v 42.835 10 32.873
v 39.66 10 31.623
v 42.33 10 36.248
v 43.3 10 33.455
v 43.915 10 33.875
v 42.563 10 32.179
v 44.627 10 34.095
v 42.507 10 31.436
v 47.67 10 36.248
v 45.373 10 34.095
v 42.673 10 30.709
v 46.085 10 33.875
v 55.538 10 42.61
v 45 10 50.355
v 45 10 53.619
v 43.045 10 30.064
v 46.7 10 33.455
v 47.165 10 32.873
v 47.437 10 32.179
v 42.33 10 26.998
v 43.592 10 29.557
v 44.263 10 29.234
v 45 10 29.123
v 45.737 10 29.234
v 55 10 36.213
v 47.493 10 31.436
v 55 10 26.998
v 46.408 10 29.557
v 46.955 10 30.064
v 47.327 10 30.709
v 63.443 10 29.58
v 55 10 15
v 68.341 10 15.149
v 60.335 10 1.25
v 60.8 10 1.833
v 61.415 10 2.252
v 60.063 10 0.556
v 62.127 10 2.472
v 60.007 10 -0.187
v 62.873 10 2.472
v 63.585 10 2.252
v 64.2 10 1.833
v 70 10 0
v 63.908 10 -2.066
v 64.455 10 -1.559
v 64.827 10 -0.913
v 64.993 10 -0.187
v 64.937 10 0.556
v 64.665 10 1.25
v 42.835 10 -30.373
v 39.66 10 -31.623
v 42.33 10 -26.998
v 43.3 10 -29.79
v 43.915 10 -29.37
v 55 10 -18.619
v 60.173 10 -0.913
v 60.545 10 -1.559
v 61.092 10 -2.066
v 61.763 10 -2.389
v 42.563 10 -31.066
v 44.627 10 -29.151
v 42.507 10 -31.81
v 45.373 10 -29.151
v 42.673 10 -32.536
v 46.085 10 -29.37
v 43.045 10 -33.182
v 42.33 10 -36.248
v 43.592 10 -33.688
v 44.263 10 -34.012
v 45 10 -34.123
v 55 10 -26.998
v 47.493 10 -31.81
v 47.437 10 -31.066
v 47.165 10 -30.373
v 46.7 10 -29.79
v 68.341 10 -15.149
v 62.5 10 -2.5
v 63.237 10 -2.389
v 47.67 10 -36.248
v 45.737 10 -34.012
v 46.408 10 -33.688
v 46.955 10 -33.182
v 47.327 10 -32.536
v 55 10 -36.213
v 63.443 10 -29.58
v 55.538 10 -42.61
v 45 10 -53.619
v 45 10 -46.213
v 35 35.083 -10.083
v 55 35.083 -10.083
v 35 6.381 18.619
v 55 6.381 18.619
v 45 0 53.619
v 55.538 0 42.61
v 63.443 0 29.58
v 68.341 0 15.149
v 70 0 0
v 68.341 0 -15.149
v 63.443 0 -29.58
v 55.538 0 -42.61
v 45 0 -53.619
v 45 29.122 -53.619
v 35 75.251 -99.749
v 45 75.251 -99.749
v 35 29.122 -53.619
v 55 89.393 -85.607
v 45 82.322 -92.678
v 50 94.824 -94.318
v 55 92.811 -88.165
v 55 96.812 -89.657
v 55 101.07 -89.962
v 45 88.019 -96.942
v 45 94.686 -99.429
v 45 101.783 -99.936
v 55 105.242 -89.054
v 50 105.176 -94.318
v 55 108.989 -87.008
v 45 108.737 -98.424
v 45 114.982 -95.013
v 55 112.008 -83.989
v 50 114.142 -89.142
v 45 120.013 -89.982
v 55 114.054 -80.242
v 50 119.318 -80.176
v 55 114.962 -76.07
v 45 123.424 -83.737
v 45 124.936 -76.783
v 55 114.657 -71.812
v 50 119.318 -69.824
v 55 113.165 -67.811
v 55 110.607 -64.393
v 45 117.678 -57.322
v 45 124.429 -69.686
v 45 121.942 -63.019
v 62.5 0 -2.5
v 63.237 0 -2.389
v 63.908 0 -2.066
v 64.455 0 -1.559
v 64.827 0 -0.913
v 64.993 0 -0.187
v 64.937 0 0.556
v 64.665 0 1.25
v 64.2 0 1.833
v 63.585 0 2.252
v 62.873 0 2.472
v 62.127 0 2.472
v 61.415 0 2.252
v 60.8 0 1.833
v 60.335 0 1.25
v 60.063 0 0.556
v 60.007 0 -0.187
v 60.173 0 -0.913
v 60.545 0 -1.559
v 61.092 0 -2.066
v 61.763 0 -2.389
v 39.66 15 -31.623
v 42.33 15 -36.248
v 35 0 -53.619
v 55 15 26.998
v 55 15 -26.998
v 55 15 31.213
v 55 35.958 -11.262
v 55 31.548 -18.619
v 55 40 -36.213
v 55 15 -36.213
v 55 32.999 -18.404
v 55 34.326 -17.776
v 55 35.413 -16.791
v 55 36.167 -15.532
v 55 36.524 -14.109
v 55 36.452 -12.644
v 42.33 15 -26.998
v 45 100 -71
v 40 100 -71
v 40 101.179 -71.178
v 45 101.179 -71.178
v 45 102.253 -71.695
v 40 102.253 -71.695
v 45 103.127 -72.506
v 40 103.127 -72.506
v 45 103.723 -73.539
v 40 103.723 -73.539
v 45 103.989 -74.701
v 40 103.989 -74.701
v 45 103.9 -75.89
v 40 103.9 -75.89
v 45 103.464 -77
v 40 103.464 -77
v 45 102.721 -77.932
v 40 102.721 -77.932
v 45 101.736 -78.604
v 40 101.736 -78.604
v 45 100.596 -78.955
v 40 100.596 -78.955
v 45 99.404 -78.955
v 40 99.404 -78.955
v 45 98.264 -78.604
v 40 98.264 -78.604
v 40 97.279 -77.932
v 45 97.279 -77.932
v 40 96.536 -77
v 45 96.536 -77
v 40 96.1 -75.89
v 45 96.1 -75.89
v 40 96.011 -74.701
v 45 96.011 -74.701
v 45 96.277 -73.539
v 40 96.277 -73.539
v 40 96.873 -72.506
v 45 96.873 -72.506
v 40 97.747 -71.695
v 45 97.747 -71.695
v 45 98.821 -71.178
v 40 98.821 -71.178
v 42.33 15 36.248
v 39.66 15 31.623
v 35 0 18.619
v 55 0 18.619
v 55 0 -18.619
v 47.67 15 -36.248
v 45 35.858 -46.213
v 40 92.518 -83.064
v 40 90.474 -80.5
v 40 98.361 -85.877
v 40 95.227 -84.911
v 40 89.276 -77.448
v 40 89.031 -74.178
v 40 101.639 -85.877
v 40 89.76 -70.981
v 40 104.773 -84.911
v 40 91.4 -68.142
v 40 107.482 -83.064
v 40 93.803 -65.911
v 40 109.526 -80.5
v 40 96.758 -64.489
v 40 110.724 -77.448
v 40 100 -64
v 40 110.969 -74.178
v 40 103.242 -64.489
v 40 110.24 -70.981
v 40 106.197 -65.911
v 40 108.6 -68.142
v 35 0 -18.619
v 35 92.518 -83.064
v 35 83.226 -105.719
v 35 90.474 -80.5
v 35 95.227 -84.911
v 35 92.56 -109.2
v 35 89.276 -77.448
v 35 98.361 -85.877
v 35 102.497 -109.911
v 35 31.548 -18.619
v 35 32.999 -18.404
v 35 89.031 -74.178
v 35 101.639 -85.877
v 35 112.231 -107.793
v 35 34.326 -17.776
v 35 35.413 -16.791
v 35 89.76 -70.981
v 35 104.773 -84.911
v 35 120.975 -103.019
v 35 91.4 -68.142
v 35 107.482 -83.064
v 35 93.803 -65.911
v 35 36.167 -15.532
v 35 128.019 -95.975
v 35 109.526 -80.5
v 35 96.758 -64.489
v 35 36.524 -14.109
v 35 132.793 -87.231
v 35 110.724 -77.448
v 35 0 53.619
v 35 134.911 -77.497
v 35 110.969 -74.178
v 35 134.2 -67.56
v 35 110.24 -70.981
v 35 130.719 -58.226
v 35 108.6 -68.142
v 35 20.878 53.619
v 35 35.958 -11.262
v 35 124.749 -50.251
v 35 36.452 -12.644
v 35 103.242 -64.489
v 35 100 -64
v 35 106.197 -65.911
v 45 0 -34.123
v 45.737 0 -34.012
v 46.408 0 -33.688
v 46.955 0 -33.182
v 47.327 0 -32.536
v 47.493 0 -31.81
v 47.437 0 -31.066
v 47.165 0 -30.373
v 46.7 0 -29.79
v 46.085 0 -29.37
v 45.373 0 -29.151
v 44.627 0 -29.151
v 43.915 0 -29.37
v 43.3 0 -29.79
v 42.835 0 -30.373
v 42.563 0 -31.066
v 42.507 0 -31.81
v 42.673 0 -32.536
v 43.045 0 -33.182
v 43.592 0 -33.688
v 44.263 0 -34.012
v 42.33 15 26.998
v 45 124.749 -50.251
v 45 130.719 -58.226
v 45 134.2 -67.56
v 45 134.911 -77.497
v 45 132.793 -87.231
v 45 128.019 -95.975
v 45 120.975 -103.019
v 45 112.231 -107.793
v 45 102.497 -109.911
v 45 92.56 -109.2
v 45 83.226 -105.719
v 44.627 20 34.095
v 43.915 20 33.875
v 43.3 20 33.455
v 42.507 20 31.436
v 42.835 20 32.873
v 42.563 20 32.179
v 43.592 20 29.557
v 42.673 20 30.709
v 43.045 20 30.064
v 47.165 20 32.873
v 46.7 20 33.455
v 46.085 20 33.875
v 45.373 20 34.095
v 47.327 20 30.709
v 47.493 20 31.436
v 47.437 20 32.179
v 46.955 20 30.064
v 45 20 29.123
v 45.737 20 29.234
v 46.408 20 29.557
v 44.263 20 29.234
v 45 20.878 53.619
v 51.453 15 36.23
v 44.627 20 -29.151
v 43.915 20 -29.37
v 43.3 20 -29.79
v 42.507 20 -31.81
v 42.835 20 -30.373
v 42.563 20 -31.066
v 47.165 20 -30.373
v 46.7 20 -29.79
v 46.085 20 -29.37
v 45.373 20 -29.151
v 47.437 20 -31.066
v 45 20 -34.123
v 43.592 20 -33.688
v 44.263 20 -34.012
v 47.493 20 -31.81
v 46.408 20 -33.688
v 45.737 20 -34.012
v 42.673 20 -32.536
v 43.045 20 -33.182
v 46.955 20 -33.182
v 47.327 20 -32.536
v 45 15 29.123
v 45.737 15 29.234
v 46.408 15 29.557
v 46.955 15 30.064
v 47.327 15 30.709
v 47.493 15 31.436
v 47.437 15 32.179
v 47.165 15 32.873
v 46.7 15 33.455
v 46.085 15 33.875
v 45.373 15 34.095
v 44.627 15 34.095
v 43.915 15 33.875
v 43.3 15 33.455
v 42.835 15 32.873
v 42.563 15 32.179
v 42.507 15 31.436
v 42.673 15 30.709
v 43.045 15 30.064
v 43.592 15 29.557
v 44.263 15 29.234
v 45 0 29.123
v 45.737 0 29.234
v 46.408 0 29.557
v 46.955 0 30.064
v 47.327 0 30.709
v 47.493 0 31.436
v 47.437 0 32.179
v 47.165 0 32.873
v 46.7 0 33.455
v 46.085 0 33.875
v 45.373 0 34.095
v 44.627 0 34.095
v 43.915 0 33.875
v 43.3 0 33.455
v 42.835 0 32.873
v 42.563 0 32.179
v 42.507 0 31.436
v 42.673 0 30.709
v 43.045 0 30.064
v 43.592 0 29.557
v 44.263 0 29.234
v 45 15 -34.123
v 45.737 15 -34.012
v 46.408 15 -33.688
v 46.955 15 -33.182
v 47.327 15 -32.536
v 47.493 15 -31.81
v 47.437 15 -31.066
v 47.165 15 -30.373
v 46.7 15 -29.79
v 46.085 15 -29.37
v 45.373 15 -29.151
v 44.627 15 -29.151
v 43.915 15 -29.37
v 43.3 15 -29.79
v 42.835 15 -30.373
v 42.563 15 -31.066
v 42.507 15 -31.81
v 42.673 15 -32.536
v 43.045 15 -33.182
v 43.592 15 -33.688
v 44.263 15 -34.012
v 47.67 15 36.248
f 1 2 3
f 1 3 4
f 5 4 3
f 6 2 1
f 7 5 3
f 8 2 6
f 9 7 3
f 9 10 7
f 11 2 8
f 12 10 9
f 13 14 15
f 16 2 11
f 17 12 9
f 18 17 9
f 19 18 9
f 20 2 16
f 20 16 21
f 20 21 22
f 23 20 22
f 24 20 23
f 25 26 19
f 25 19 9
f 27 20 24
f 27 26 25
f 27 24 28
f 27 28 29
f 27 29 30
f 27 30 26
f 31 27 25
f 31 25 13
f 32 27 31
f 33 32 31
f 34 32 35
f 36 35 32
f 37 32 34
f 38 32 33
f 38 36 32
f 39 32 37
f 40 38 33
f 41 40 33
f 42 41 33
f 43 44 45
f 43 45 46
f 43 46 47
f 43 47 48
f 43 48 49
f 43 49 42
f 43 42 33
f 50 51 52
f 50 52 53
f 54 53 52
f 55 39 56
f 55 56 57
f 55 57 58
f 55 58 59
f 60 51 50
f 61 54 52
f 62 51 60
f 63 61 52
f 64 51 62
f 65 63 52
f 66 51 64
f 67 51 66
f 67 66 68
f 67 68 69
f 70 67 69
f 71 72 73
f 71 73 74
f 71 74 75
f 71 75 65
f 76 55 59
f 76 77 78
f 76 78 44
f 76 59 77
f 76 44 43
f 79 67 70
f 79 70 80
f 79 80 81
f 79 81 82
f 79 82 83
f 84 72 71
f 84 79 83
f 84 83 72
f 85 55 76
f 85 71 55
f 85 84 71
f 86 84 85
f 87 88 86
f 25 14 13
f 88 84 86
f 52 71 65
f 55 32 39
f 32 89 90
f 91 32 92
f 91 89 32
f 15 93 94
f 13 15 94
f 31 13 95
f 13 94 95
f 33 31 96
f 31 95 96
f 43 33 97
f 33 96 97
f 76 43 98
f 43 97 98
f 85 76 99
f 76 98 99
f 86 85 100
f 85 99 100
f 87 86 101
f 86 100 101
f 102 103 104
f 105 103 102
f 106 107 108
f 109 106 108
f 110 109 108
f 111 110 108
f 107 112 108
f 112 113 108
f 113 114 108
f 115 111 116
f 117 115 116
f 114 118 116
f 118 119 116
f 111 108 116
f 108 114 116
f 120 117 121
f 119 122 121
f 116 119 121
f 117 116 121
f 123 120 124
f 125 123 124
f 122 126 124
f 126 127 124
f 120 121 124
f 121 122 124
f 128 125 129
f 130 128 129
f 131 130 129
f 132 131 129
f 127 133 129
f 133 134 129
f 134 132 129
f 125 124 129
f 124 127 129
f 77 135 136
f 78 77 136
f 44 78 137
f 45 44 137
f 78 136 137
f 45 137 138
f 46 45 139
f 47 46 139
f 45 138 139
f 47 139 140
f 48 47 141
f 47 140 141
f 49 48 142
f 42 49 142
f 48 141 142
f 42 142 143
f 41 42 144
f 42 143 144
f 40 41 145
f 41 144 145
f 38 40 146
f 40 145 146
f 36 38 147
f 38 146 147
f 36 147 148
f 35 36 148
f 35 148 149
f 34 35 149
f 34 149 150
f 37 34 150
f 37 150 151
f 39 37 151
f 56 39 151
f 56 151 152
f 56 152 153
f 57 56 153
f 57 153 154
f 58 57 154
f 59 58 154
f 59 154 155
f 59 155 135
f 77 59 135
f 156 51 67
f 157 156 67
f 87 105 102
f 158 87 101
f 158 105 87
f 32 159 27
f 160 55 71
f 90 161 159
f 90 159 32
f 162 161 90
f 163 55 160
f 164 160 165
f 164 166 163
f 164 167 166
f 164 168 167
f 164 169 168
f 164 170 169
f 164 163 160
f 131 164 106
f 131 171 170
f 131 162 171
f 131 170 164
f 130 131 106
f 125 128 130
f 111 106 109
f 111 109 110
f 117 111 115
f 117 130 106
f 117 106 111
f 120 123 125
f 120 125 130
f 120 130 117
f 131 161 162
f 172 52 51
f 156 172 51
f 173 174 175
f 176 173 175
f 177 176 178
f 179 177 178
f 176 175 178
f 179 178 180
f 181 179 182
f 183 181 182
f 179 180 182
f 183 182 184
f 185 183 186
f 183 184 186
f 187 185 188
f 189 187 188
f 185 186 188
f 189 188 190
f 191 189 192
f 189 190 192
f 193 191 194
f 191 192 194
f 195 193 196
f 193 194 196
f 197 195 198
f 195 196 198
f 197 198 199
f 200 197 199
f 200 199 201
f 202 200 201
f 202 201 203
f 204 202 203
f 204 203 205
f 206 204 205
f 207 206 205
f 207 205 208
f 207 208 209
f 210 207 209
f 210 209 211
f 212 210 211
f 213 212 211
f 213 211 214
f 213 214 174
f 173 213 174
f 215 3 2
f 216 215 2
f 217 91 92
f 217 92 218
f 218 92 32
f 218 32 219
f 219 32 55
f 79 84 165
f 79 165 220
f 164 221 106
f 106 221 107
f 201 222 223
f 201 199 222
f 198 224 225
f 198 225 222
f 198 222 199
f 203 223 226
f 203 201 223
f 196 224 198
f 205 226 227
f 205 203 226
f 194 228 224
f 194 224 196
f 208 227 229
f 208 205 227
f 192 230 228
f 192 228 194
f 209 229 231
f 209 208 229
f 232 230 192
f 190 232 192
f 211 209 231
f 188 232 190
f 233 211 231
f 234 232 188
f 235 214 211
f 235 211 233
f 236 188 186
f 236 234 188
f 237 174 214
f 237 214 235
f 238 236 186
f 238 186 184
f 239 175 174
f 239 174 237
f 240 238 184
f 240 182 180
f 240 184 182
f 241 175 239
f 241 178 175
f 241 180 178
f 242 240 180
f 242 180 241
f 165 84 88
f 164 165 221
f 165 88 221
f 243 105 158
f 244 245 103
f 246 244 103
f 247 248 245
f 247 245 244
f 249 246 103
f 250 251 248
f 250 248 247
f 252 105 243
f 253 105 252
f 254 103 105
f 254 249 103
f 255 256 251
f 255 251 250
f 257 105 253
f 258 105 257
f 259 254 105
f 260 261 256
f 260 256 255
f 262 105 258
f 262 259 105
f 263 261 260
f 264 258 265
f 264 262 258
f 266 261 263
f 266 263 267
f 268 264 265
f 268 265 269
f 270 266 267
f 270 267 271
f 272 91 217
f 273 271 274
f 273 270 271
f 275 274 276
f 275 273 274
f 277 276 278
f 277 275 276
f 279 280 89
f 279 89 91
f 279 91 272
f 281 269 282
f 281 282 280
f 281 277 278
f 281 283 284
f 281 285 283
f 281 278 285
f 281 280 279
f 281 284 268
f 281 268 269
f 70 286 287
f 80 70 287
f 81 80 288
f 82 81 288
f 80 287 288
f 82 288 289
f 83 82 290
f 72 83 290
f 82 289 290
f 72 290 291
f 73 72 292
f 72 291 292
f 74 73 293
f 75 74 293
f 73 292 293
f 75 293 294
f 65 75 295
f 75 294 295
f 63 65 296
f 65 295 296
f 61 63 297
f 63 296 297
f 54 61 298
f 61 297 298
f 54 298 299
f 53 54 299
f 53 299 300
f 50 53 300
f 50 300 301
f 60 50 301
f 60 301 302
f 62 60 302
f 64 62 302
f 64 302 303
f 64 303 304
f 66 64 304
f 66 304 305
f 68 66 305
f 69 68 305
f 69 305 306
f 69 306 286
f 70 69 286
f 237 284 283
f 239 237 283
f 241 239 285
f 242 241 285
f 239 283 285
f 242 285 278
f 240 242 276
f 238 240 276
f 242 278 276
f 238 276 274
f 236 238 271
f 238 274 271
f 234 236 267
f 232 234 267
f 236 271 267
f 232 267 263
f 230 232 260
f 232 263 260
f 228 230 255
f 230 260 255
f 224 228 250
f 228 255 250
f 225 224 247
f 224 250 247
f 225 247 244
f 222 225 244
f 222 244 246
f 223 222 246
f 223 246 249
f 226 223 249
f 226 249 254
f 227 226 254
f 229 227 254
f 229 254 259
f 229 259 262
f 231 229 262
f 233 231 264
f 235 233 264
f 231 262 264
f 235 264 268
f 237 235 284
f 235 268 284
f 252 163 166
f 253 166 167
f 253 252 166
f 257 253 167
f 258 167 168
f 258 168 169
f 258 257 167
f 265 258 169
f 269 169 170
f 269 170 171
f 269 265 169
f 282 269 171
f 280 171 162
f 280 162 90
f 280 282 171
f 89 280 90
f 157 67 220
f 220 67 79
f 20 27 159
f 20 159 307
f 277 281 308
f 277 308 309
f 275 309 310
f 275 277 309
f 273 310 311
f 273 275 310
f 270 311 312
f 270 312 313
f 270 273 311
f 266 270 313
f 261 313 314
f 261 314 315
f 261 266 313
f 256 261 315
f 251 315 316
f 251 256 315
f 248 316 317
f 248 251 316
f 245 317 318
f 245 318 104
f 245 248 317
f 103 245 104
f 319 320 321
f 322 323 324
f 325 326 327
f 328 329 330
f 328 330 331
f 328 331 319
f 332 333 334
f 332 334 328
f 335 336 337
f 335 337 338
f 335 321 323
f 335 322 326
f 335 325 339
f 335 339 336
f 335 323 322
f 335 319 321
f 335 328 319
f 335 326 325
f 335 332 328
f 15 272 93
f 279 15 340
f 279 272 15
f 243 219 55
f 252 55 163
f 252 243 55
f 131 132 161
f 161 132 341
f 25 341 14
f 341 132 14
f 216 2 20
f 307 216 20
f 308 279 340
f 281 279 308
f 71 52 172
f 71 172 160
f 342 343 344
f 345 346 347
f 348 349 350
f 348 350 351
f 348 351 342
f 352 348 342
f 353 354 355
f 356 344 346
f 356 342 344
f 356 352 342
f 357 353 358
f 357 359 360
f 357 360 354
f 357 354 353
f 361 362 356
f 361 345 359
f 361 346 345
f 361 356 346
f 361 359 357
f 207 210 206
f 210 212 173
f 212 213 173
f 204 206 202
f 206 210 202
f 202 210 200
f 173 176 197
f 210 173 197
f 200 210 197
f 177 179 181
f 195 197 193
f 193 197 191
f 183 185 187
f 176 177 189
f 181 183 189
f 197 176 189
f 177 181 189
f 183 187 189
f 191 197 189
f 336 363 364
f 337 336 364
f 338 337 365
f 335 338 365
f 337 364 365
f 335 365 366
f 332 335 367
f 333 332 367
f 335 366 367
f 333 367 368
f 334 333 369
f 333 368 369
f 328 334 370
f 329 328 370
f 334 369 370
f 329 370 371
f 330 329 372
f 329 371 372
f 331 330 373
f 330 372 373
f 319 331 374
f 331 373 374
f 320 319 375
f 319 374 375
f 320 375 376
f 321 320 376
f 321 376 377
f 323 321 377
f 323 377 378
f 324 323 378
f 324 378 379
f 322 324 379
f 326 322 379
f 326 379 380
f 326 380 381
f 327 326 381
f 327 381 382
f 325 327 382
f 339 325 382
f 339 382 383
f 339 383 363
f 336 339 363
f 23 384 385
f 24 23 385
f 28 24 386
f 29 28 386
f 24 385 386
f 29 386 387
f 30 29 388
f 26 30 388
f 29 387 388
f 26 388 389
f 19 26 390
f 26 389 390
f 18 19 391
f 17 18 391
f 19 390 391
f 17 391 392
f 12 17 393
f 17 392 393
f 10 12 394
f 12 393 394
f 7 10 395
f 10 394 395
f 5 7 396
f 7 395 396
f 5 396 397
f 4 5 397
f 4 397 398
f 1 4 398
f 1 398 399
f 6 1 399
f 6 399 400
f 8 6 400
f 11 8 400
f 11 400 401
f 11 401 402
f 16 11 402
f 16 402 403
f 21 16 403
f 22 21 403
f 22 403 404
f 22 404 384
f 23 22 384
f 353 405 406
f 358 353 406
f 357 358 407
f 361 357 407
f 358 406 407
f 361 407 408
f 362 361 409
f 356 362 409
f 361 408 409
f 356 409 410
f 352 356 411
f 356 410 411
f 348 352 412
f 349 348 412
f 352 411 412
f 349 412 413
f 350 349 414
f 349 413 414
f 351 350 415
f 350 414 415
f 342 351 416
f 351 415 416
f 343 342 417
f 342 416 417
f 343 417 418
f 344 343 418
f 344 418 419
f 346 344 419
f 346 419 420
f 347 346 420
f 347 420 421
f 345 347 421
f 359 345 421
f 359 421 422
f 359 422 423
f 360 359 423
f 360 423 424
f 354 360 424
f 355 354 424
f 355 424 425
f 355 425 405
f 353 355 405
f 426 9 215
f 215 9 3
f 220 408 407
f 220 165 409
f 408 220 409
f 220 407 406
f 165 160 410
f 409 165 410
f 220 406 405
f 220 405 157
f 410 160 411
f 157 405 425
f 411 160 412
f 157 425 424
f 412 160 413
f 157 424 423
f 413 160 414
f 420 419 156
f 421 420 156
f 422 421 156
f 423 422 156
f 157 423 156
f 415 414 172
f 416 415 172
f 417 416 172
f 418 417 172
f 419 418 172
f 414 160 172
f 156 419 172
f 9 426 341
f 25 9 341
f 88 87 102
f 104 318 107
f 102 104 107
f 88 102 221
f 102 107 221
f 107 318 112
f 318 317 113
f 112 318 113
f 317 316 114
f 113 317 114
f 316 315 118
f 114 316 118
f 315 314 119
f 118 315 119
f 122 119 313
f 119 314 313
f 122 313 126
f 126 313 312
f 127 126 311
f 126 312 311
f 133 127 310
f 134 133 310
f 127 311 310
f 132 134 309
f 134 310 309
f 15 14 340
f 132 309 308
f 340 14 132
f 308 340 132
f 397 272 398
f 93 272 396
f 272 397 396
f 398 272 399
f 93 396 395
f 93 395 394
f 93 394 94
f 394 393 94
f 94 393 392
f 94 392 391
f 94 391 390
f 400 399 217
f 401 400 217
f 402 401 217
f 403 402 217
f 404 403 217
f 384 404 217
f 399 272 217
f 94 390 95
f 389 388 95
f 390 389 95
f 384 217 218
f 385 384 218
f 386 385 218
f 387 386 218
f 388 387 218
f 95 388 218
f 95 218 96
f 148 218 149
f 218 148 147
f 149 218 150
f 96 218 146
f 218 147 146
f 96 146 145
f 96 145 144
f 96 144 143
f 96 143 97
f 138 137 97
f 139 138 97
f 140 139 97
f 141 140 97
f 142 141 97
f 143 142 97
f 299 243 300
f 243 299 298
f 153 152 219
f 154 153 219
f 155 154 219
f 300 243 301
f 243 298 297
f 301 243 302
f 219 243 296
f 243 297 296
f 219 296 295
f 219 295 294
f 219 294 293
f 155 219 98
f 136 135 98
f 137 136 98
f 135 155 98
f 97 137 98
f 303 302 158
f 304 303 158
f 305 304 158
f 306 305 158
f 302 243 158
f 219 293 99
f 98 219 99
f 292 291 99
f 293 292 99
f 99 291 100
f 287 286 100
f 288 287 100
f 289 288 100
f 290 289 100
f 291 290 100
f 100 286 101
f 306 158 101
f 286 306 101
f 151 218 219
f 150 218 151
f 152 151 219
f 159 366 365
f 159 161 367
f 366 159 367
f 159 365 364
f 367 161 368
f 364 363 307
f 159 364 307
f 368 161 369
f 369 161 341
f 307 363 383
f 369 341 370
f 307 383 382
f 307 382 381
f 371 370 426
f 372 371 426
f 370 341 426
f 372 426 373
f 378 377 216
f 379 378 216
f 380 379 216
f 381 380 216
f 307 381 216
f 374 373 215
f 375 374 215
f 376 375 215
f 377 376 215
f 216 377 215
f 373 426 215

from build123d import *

# Parameters (mm, degrees)
BOSS_EXTRUDE3_DEPTH = 10
SKETCH4_R           = 35
SKETCH4_R_2         = 4
BOSS_EXTRUDE4_DEPTH = 10
BOSS_EXTRUDE6_DEPTH = 10
CHAMFER2_SIZE       = 30
CHAMFER2_SIZE2      = 42.426406871
CHAMFER3_SIZE       = 10
CUT_EXTRUDE1_DEPTH  = 20
SKETCH8_R           = 2.5
CUT_EXTRUDE2_DEPTH  = 20
CUT_EXTRUDE4_START  = -10
SKETCH9_R           = 2.5
CUT_EXTRUDE4_DEPTH  = 5
SKETCH10_R          = 11
CUT_EXTRUDE5_DEPTH  = 5


with BuildPart() as part:
    # Sketch3 → Boss-Extrude3 (new body)
    with BuildSketch(Plane(origin=(0, 0, 0), x_dir=(1, 0, 0), z_dir=(0, 1, 0))):
        with BuildLine():
            Line((45, 53.619026474), (35, 53.619026474))
            Line((35, 53.619026474), (35, -53.619026474))
            Line((35, -53.619026474), (45, -53.619026474))
            ThreePointArc((45, -53.619026474), (70, 0), (45, 53.619026474))
        make_face()
    extrude(amount=BOSS_EXTRUDE3_DEPTH)

    # Sketch4 → Boss-Extrude4 (add)
    # profile 1 of 2: a face of its own
    with BuildSketch(Plane.ZY.offset(-35)):
        with BuildLine():
            Line((-53.619026474, 29.121551791), (-53.619026474, 10))
            Line((-53.619026474, 10), (53.619026474, 10))
            Line((53.619026474, 10), (53.619026474, 20.878448209))
            Line((53.619026474, 20.878448209), (-50.251262658, 124.748737342))
            ThreePointArc((-50.251262658, 124.748737342), (-42.664216362, 113.393920133), (-40, 100))
            ThreePointArc((-40, 100), (-61.606079867, 67.664216362), (-99.748737342, 75.251262658))
            Line((-99.748737342, 75.251262658), (-53.619026474, 29.121551791))
        make_face()
    # profile 2 of 2: a face of its own
    with BuildSketch(Plane.ZY.offset(-35)):
        with Locations((-75, 100)):
            Circle(SKETCH4_R)
        with Locations((-75, 100)):
            Circle(SKETCH4_R_2, mode=Mode.SUBTRACT)
    extrude(amount=-BOSS_EXTRUDE4_DEPTH)

    # Sketch6 → Boss-Extrude6 (add)
    with BuildSketch(Plane(origin=(45, 0, 0), x_dir=(0, 0, -1), z_dir=(1, 0, 0))):
        with BuildLine():
            Line((64.393398282, 110.606601718), (-36.213203436, 10))
            Line((-36.213203436, 10), (6.213203436, 10))
            Line((6.213203436, 10), (85.606601718, 89.393398282))
            ThreePointArc((85.606601718, 89.393398282), (85.606601718, 110.606601718), (64.393398282, 110.606601718))
        make_face()
    extrude(amount=BOSS_EXTRUDE6_DEPTH)

    # Chamfer2
    chamfer2_edges = [part.edges().sort_by_distance(p)[0] for p in [
        (50, 10, -6.213203436),
    ]]
    chamfer2_side = [part.faces().sort_by_distance(p)[0] for p in [
        (56.695914019, 10, -4.424051509),
    ]]
    chamfer(chamfer2_edges, length=CHAMFER2_SIZE, length2=CHAMFER2_SIZE2, reference=chamfer2_side[0])

    # Chamfer3
    chamfer3_edges = [part.edges().sort_by_distance(p)[0] for p in [
        (45, 25, -36.213203436),
        (45, 64.696699141, -60.909902577),
        (45, 110.606601718, -85.606601718),
        (45, 60.303300859, -14.090097423),
    ]]
    chamfer(chamfer3_edges, length=CHAMFER3_SIZE - 0.0001)  # a hair under: the kernel refuses the full size

    # Sketch7 → Cut-Extrude1 (cut)
    with BuildSketch(Plane.ZY.offset(-35)):
        with BuildLine():
            Line((18.619026474, 6.380973526), (18.619026474, 0))
            Line((18.619026474, 0), (-18.619026474, 0))
            Line((-18.619026474, 0), (-18.619026474, 31.547958662))
            ThreePointArc((-18.619026474, 31.547958662), (-15.532443636, 36.167356325), (-10.083492568, 35.083492568))
            Line((-10.083492568, 35.083492568), (18.619026474, 6.380973526))
        make_face()
    extrude(amount=-CUT_EXTRUDE1_DEPTH, mode=Mode.SUBTRACT)

    # Sketch8 → Cut-Extrude2 (cut)
    with BuildSketch(Plane.XZ):
        with Locations(Location((45, 31.622776602, 0), (0, 0, 270))):
            Circle(SKETCH8_R)
        with Locations(Location((45, -31.622776602, 0), (0, 0, 270))):
            Circle(SKETCH8_R)
        with Locations(Location((62.5, 0, 0), (0, 0, 270))):
            Circle(SKETCH8_R)
    extrude(amount=-CUT_EXTRUDE2_DEPTH, mode=Mode.SUBTRACT)

    # Sketch9 → Cut-Extrude4 (cut)
    # profile 1 of 4: a face of its own
    with BuildSketch(Plane.XZ.offset(CUT_EXTRUDE4_START)):
        Polygon((55, 26.997776602), (47.670244995, 26.997776602), (50.34048999, 31.622776602), (47.670244995, 36.247776602), (55, 36.213203436), align=None)
    # profile 2 of 4: a face of its own
    with BuildSketch(Plane.XZ.offset(CUT_EXTRUDE4_START)):
        Polygon((42.329755005, 26.997776602), (47.670244995, 26.997776602), (50.34048999, 31.622776602), (47.670244995, 36.247776602), (42.329755005, 36.247776602), (39.65951001, 31.622776602), align=None)
        with Locations(Location((45, 31.622776602, 0), (0, 0, 270))):
            Circle(SKETCH9_R, mode=Mode.SUBTRACT)
    # profile 3 of 4: a face of its own
    with BuildSketch(Plane.XZ.offset(CUT_EXTRUDE4_START)):
        Polygon((55, -36.213203436), (47.670244995, -36.247776602), (50.34048999, -31.622776602), (47.670244995, -26.997776602), (55, -26.997776602), align=None)
    # profile 4 of 4: a face of its own
    with BuildSketch(Plane.XZ.offset(CUT_EXTRUDE4_START)):
        Polygon((42.329755005, -36.247776602), (47.670244995, -36.247776602), (50.34048999, -31.622776602), (47.670244995, -26.997776602), (42.329755005, -26.997776602), (39.65951001, -31.622776602), align=None)
        with Locations(Location((45, -31.622776602, 0), (0, 0, 270))):
            Circle(SKETCH9_R, mode=Mode.SUBTRACT)
    extrude(amount=-CUT_EXTRUDE4_DEPTH, mode=Mode.SUBTRACT)

    # Sketch10 → Cut-Extrude5 (cut)
    with BuildSketch(Plane.ZY.offset(-35)):
        with Locations((-75, 100)):
            Circle(SKETCH10_R)
    extrude(amount=-CUT_EXTRUDE5_DEPTH, mode=Mode.SUBTRACT)


solid = part.part
